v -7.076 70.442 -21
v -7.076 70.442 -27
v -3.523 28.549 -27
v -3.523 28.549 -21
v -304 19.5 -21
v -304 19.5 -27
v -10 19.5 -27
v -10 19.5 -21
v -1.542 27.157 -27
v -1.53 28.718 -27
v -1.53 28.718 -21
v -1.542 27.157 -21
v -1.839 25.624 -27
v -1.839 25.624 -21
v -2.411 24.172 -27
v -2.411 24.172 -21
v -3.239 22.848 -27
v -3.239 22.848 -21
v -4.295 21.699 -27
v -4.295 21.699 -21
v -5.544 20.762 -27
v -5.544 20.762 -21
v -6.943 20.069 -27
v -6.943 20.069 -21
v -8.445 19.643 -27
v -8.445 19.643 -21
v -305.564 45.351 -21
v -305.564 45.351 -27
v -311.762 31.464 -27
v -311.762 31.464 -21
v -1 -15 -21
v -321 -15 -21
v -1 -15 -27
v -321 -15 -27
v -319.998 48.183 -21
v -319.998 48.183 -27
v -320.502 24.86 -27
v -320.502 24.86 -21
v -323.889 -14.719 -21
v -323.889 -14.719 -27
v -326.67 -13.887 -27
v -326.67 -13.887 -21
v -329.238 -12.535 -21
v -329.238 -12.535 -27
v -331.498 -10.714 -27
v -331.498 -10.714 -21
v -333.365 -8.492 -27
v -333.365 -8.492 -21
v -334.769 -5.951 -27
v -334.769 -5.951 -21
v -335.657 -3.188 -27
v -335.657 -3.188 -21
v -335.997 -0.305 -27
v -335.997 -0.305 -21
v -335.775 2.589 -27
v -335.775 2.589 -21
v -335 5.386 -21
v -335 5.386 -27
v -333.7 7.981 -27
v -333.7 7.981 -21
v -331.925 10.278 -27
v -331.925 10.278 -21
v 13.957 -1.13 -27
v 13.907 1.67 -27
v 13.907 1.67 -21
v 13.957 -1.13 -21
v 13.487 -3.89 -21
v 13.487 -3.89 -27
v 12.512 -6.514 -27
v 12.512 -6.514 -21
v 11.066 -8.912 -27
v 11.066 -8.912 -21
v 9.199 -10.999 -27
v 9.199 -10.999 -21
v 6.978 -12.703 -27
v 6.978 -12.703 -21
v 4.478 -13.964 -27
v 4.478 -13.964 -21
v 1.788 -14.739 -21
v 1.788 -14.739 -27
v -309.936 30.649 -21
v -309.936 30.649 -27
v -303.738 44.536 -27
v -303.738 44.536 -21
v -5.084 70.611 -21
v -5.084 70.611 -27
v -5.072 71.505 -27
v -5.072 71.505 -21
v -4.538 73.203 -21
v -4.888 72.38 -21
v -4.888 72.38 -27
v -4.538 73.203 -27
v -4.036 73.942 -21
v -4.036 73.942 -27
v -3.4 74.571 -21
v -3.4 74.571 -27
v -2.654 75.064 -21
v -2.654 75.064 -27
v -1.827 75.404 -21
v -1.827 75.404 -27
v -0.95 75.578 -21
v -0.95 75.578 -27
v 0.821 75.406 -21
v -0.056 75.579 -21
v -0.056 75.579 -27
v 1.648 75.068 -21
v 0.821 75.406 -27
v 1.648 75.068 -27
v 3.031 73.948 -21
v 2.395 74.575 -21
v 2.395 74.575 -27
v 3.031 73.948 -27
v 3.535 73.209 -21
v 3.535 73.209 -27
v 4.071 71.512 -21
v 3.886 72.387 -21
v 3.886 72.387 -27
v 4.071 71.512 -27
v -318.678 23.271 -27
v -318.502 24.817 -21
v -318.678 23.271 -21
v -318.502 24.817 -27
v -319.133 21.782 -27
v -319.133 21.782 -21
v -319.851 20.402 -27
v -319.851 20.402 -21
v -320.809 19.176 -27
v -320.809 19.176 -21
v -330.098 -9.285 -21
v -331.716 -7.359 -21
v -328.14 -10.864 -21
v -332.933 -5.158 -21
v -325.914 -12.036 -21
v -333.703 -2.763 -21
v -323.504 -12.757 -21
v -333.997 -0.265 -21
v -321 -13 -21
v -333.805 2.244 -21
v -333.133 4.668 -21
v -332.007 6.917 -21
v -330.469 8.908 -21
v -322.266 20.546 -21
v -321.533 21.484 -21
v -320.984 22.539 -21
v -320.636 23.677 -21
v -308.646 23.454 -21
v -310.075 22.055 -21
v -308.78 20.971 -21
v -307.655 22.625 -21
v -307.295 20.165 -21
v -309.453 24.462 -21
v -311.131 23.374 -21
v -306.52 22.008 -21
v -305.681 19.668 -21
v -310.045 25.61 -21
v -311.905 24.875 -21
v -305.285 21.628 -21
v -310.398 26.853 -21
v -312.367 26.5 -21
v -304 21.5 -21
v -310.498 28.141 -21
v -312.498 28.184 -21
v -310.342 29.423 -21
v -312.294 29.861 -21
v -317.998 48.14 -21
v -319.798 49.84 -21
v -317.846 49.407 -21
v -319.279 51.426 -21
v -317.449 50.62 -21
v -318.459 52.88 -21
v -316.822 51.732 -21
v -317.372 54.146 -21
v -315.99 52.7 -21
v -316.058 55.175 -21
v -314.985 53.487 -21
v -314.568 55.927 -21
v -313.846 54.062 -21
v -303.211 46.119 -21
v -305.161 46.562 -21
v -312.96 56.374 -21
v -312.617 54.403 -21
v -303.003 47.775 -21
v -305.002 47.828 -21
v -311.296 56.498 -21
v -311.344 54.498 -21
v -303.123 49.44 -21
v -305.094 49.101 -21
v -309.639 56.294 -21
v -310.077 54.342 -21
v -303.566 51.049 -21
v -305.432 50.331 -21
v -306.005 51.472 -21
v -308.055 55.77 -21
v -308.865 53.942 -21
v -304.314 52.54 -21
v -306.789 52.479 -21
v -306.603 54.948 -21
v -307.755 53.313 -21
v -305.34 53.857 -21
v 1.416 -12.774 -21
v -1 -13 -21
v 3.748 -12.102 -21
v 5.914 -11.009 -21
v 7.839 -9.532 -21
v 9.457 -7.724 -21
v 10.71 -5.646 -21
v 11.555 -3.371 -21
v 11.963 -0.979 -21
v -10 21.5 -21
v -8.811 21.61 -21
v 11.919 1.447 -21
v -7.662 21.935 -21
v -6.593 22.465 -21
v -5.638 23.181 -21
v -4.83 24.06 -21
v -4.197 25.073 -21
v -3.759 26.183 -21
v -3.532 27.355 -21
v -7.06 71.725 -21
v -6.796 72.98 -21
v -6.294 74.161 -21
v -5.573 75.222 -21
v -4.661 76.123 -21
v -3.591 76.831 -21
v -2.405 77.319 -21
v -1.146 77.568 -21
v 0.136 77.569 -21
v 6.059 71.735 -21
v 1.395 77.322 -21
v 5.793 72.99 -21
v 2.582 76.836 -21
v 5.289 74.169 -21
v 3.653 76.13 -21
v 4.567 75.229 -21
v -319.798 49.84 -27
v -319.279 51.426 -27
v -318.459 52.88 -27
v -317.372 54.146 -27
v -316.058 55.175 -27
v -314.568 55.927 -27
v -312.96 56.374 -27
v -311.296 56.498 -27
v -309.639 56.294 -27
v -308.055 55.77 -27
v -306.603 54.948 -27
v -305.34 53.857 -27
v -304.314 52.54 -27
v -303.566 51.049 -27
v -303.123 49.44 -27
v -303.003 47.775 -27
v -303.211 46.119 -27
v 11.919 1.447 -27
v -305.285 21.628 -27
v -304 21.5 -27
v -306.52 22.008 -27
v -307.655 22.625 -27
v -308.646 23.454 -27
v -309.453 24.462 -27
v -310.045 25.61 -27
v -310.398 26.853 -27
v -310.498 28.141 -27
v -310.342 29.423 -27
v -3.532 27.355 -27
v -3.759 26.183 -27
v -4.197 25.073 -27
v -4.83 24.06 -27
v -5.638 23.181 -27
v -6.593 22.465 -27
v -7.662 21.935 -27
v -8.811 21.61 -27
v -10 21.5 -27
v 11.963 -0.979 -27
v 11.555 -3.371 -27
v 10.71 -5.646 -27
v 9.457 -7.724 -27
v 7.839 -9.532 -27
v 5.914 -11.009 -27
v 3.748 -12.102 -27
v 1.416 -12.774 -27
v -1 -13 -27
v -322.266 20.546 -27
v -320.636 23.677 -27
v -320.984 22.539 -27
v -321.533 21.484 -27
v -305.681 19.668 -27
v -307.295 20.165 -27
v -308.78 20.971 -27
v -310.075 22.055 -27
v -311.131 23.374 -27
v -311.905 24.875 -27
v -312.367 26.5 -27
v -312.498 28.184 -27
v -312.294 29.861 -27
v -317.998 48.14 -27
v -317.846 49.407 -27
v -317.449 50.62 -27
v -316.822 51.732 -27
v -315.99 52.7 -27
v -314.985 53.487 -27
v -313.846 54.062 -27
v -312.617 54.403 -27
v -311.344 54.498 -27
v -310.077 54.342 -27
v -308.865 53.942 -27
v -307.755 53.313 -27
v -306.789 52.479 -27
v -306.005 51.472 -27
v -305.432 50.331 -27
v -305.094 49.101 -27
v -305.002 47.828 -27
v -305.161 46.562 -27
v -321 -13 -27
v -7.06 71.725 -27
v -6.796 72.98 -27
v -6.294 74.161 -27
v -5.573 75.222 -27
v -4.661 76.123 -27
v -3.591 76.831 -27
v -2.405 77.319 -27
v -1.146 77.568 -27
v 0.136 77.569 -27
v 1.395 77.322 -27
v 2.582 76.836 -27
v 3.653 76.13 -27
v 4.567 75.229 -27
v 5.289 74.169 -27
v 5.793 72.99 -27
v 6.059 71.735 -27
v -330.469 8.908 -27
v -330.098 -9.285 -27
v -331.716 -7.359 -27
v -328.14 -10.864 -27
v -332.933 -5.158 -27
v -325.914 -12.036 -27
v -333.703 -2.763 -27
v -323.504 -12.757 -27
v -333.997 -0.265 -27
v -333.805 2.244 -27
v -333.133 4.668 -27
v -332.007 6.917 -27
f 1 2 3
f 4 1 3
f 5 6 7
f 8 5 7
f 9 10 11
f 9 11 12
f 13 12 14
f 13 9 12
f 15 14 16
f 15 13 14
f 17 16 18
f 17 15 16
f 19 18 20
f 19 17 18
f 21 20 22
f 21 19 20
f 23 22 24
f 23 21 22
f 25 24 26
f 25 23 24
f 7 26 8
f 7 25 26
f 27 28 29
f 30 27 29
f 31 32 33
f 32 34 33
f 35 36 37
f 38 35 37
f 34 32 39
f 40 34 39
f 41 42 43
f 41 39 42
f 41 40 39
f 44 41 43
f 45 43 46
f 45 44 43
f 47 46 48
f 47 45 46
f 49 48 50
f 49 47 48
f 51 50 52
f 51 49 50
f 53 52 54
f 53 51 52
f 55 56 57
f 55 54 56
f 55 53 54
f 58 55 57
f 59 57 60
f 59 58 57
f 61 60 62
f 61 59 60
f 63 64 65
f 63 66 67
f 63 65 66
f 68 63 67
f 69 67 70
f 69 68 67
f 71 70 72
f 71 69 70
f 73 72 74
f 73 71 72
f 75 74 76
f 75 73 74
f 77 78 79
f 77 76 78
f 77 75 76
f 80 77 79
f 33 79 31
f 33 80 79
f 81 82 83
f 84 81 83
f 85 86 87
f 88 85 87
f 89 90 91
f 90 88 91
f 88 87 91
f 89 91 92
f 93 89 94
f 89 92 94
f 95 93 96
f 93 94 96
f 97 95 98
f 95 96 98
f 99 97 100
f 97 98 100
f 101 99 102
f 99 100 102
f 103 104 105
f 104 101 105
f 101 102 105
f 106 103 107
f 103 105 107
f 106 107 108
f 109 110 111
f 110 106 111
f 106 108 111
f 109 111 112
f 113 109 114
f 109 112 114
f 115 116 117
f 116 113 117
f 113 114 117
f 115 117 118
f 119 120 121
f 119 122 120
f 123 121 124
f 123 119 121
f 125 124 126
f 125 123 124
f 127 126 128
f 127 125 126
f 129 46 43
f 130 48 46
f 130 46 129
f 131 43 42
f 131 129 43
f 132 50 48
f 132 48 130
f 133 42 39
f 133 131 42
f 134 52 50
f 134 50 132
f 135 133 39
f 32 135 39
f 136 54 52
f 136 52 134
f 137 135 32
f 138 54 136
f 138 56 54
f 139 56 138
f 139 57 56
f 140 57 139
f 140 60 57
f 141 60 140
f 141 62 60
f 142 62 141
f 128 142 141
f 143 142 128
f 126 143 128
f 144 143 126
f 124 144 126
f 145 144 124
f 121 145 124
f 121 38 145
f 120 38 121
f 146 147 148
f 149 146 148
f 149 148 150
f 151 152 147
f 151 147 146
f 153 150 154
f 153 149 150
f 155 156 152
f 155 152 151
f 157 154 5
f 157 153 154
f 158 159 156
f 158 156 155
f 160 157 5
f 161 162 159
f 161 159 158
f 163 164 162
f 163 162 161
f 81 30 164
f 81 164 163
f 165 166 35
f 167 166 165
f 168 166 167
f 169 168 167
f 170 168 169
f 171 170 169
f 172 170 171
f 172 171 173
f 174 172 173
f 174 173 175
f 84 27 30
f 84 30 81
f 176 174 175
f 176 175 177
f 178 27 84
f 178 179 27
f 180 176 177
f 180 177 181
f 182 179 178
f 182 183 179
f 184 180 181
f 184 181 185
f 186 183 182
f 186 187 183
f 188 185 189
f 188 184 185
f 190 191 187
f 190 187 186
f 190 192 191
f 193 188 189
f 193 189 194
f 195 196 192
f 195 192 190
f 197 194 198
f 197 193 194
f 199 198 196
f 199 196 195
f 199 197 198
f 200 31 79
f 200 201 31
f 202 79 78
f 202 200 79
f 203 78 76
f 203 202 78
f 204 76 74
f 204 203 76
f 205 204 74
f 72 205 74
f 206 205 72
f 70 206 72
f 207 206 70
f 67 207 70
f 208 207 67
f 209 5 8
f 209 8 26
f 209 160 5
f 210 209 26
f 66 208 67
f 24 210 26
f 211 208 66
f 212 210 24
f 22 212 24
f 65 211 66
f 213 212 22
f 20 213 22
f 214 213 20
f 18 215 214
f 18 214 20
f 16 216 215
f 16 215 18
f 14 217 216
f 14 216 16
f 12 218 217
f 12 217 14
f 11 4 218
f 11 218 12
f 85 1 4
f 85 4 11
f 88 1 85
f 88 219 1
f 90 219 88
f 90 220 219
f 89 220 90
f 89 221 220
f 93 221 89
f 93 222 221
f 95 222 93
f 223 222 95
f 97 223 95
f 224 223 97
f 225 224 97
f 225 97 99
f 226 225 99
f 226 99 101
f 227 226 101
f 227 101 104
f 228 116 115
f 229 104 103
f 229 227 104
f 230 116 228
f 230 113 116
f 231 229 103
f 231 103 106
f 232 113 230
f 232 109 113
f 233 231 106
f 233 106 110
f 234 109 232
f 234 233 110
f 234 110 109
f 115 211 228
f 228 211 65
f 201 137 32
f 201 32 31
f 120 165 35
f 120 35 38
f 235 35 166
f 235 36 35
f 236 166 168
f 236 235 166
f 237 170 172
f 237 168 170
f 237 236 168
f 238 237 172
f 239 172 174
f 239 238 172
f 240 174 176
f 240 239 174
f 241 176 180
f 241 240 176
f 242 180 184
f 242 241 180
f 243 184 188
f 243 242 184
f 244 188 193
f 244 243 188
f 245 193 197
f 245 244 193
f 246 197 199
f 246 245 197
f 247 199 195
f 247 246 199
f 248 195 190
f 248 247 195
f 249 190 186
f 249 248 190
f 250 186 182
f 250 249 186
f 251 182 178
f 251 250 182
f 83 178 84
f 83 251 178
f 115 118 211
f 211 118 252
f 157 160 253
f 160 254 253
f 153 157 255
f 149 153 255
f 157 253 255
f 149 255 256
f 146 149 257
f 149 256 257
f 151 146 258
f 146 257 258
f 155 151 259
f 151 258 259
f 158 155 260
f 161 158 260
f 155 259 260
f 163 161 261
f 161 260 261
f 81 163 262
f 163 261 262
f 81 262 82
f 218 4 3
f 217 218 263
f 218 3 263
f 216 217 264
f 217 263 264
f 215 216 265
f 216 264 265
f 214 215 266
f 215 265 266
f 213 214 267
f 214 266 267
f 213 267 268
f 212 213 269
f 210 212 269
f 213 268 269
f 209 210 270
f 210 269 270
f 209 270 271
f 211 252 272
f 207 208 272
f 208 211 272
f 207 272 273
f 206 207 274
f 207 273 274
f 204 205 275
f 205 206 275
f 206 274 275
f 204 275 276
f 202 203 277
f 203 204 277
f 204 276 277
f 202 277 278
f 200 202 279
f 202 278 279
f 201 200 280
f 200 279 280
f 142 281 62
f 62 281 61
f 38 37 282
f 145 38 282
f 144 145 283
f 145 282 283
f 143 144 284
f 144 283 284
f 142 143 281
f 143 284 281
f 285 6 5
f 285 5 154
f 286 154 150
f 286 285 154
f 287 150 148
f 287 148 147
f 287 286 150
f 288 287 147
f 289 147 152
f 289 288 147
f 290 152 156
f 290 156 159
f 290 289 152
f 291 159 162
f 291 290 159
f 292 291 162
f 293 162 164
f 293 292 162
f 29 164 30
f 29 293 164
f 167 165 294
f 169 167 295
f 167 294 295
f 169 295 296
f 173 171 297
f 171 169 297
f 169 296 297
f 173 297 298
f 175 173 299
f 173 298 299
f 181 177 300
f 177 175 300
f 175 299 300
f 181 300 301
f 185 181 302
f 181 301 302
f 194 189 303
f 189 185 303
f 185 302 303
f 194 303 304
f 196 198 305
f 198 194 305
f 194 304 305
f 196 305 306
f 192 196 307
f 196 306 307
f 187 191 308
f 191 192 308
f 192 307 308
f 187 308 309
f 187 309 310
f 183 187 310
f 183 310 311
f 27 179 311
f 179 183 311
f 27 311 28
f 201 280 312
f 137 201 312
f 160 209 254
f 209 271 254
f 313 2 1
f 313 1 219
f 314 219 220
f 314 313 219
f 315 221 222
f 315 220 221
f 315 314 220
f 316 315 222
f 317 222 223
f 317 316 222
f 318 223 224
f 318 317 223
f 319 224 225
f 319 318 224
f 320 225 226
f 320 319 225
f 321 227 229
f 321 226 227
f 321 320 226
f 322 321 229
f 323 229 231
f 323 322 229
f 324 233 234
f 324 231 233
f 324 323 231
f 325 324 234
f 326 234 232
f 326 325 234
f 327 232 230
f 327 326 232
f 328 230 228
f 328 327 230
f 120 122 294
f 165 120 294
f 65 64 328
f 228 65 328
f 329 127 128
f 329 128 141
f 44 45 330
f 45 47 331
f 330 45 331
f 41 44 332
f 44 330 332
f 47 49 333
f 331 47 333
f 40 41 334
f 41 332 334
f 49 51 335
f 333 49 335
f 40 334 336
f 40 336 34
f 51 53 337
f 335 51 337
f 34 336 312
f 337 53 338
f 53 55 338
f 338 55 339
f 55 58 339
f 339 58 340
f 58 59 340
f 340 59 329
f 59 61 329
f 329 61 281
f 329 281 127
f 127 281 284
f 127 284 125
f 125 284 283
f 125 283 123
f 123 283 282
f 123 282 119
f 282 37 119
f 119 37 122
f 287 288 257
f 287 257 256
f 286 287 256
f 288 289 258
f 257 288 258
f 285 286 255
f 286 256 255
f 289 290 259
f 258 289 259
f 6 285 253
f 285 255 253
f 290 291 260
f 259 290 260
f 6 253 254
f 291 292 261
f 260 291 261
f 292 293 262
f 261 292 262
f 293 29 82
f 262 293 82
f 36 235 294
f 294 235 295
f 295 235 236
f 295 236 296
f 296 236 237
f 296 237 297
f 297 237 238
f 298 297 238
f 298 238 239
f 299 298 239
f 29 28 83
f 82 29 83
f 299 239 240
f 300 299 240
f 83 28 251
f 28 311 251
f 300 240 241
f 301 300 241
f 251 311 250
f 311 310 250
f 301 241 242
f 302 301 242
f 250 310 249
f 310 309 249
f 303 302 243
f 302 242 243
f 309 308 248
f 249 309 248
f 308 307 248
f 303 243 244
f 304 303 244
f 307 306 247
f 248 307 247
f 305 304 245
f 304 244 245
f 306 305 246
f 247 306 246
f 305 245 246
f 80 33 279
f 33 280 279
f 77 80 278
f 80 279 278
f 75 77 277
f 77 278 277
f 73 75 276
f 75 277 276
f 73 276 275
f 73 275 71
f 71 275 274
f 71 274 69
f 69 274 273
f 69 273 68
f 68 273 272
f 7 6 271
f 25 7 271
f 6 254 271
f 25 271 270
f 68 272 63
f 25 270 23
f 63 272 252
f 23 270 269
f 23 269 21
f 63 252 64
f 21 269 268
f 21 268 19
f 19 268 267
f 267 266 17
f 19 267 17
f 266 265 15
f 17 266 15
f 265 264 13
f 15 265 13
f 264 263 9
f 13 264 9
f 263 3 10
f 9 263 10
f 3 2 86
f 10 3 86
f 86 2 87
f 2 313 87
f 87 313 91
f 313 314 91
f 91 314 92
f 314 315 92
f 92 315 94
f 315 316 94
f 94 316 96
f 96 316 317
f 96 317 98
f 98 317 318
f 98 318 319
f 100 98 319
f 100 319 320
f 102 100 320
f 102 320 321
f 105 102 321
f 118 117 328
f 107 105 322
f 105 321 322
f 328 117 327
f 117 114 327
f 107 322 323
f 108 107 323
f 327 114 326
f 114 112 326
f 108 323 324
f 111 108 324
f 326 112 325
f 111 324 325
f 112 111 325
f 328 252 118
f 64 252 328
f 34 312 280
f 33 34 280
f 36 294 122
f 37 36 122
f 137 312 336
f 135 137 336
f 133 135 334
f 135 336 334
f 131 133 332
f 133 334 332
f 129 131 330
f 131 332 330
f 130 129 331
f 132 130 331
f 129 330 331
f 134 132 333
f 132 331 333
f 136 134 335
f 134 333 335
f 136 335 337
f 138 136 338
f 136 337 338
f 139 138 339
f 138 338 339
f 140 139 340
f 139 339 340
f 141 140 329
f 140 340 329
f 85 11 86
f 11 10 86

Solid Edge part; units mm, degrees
sketch "Sketch1" plane through (0, 0, -27) normal (0, 0, 1) x (1, 0, 0)
  line L0 (-304, 19.5) -> (-10, 19.5)
  line L1 (-1.5304, 28.7183) -> (-5.0835, 70.6112)
  line L2 (4.0714, 71.512) -> (11.9192, 1.447)
  line L3 (-1, -13) -> (-321, -13)
  line L4 (-320.8089, 19.1759) -> (-330.4687, 8.9075)
  line L5 (-318.502, 24.8166) -> (-317.9985, 48.1403)
  line L6 (-305.5643, 45.3509) -> (-311.762, 31.4642)
  arc A0 (-1.5304, 28.7183) -> (-10, 19.5) centre (-10, 28) cw
  arc A1 (4.0714, 71.512) -> (-5.0835, 70.6112) centre (-0.5, 71) ccw
  arc A2 (-1, -13) -> (11.9192, 1.447) centre (-1, 0) ccw
  arc A3 (-321, -13) -> (-330.4687, 8.9075) centre (-321, 0) cw
  arc A4 (-318.502, 24.8166) -> (-320.8089, 19.1759) centre (-327, 25) cw
  arc A5 (-305.5643, 45.3509) -> (-317.9985, 48.1403) centre (-311.5, 48) ccw
  arc A6 (-304, 19.5) -> (-311.762, 31.4642) centre (-304, 28) cw
  line L7 (-10, 21.5) -> (-304, 21.5)
  arc A7 (-304, 21.5) -> (-309.9357, 30.6491) centre (-304, 28) cw
  line L8 (-309.9357, 30.6491) -> (-303.738, 44.5358)
  arc A8 (-303.738, 44.5358) -> (-319.998, 48.1834) centre (-311.5, 48) ccw
  line L9 (-319.998, 48.1834) -> (-320.5015, 24.8597)
  arc A9 (-320.5015, 24.8597) -> (-322.2657, 20.5462) centre (-327, 25) cw
  line L10 (-322.2657, 20.5462) -> (-331.9254, 10.2779)
  arc A10 (-331.9254, 10.2779) -> (-321, -15) centre (-321, 0) ccw
  line L11 (-321, -15) -> (-1, -15)
  arc A11 (-1, -15) -> (13.9068, 1.6697) centre (-1, 0) ccw
  line L12 (13.9068, 1.6697) -> (6.059, 71.7347)
  arc A12 (6.059, 71.7347) -> (-7.0764, 70.4422) centre (-0.5, 71) ccw
  line L13 (-7.0764, 70.4422) -> (-3.5233, 28.5493)
  arc A13 (-3.5233, 28.5493) -> (-10, 21.5) centre (-10, 28) cw
extrude "Protrusion1" add sketch "Sketch1" along normal blind 6
properties material "PVC"
